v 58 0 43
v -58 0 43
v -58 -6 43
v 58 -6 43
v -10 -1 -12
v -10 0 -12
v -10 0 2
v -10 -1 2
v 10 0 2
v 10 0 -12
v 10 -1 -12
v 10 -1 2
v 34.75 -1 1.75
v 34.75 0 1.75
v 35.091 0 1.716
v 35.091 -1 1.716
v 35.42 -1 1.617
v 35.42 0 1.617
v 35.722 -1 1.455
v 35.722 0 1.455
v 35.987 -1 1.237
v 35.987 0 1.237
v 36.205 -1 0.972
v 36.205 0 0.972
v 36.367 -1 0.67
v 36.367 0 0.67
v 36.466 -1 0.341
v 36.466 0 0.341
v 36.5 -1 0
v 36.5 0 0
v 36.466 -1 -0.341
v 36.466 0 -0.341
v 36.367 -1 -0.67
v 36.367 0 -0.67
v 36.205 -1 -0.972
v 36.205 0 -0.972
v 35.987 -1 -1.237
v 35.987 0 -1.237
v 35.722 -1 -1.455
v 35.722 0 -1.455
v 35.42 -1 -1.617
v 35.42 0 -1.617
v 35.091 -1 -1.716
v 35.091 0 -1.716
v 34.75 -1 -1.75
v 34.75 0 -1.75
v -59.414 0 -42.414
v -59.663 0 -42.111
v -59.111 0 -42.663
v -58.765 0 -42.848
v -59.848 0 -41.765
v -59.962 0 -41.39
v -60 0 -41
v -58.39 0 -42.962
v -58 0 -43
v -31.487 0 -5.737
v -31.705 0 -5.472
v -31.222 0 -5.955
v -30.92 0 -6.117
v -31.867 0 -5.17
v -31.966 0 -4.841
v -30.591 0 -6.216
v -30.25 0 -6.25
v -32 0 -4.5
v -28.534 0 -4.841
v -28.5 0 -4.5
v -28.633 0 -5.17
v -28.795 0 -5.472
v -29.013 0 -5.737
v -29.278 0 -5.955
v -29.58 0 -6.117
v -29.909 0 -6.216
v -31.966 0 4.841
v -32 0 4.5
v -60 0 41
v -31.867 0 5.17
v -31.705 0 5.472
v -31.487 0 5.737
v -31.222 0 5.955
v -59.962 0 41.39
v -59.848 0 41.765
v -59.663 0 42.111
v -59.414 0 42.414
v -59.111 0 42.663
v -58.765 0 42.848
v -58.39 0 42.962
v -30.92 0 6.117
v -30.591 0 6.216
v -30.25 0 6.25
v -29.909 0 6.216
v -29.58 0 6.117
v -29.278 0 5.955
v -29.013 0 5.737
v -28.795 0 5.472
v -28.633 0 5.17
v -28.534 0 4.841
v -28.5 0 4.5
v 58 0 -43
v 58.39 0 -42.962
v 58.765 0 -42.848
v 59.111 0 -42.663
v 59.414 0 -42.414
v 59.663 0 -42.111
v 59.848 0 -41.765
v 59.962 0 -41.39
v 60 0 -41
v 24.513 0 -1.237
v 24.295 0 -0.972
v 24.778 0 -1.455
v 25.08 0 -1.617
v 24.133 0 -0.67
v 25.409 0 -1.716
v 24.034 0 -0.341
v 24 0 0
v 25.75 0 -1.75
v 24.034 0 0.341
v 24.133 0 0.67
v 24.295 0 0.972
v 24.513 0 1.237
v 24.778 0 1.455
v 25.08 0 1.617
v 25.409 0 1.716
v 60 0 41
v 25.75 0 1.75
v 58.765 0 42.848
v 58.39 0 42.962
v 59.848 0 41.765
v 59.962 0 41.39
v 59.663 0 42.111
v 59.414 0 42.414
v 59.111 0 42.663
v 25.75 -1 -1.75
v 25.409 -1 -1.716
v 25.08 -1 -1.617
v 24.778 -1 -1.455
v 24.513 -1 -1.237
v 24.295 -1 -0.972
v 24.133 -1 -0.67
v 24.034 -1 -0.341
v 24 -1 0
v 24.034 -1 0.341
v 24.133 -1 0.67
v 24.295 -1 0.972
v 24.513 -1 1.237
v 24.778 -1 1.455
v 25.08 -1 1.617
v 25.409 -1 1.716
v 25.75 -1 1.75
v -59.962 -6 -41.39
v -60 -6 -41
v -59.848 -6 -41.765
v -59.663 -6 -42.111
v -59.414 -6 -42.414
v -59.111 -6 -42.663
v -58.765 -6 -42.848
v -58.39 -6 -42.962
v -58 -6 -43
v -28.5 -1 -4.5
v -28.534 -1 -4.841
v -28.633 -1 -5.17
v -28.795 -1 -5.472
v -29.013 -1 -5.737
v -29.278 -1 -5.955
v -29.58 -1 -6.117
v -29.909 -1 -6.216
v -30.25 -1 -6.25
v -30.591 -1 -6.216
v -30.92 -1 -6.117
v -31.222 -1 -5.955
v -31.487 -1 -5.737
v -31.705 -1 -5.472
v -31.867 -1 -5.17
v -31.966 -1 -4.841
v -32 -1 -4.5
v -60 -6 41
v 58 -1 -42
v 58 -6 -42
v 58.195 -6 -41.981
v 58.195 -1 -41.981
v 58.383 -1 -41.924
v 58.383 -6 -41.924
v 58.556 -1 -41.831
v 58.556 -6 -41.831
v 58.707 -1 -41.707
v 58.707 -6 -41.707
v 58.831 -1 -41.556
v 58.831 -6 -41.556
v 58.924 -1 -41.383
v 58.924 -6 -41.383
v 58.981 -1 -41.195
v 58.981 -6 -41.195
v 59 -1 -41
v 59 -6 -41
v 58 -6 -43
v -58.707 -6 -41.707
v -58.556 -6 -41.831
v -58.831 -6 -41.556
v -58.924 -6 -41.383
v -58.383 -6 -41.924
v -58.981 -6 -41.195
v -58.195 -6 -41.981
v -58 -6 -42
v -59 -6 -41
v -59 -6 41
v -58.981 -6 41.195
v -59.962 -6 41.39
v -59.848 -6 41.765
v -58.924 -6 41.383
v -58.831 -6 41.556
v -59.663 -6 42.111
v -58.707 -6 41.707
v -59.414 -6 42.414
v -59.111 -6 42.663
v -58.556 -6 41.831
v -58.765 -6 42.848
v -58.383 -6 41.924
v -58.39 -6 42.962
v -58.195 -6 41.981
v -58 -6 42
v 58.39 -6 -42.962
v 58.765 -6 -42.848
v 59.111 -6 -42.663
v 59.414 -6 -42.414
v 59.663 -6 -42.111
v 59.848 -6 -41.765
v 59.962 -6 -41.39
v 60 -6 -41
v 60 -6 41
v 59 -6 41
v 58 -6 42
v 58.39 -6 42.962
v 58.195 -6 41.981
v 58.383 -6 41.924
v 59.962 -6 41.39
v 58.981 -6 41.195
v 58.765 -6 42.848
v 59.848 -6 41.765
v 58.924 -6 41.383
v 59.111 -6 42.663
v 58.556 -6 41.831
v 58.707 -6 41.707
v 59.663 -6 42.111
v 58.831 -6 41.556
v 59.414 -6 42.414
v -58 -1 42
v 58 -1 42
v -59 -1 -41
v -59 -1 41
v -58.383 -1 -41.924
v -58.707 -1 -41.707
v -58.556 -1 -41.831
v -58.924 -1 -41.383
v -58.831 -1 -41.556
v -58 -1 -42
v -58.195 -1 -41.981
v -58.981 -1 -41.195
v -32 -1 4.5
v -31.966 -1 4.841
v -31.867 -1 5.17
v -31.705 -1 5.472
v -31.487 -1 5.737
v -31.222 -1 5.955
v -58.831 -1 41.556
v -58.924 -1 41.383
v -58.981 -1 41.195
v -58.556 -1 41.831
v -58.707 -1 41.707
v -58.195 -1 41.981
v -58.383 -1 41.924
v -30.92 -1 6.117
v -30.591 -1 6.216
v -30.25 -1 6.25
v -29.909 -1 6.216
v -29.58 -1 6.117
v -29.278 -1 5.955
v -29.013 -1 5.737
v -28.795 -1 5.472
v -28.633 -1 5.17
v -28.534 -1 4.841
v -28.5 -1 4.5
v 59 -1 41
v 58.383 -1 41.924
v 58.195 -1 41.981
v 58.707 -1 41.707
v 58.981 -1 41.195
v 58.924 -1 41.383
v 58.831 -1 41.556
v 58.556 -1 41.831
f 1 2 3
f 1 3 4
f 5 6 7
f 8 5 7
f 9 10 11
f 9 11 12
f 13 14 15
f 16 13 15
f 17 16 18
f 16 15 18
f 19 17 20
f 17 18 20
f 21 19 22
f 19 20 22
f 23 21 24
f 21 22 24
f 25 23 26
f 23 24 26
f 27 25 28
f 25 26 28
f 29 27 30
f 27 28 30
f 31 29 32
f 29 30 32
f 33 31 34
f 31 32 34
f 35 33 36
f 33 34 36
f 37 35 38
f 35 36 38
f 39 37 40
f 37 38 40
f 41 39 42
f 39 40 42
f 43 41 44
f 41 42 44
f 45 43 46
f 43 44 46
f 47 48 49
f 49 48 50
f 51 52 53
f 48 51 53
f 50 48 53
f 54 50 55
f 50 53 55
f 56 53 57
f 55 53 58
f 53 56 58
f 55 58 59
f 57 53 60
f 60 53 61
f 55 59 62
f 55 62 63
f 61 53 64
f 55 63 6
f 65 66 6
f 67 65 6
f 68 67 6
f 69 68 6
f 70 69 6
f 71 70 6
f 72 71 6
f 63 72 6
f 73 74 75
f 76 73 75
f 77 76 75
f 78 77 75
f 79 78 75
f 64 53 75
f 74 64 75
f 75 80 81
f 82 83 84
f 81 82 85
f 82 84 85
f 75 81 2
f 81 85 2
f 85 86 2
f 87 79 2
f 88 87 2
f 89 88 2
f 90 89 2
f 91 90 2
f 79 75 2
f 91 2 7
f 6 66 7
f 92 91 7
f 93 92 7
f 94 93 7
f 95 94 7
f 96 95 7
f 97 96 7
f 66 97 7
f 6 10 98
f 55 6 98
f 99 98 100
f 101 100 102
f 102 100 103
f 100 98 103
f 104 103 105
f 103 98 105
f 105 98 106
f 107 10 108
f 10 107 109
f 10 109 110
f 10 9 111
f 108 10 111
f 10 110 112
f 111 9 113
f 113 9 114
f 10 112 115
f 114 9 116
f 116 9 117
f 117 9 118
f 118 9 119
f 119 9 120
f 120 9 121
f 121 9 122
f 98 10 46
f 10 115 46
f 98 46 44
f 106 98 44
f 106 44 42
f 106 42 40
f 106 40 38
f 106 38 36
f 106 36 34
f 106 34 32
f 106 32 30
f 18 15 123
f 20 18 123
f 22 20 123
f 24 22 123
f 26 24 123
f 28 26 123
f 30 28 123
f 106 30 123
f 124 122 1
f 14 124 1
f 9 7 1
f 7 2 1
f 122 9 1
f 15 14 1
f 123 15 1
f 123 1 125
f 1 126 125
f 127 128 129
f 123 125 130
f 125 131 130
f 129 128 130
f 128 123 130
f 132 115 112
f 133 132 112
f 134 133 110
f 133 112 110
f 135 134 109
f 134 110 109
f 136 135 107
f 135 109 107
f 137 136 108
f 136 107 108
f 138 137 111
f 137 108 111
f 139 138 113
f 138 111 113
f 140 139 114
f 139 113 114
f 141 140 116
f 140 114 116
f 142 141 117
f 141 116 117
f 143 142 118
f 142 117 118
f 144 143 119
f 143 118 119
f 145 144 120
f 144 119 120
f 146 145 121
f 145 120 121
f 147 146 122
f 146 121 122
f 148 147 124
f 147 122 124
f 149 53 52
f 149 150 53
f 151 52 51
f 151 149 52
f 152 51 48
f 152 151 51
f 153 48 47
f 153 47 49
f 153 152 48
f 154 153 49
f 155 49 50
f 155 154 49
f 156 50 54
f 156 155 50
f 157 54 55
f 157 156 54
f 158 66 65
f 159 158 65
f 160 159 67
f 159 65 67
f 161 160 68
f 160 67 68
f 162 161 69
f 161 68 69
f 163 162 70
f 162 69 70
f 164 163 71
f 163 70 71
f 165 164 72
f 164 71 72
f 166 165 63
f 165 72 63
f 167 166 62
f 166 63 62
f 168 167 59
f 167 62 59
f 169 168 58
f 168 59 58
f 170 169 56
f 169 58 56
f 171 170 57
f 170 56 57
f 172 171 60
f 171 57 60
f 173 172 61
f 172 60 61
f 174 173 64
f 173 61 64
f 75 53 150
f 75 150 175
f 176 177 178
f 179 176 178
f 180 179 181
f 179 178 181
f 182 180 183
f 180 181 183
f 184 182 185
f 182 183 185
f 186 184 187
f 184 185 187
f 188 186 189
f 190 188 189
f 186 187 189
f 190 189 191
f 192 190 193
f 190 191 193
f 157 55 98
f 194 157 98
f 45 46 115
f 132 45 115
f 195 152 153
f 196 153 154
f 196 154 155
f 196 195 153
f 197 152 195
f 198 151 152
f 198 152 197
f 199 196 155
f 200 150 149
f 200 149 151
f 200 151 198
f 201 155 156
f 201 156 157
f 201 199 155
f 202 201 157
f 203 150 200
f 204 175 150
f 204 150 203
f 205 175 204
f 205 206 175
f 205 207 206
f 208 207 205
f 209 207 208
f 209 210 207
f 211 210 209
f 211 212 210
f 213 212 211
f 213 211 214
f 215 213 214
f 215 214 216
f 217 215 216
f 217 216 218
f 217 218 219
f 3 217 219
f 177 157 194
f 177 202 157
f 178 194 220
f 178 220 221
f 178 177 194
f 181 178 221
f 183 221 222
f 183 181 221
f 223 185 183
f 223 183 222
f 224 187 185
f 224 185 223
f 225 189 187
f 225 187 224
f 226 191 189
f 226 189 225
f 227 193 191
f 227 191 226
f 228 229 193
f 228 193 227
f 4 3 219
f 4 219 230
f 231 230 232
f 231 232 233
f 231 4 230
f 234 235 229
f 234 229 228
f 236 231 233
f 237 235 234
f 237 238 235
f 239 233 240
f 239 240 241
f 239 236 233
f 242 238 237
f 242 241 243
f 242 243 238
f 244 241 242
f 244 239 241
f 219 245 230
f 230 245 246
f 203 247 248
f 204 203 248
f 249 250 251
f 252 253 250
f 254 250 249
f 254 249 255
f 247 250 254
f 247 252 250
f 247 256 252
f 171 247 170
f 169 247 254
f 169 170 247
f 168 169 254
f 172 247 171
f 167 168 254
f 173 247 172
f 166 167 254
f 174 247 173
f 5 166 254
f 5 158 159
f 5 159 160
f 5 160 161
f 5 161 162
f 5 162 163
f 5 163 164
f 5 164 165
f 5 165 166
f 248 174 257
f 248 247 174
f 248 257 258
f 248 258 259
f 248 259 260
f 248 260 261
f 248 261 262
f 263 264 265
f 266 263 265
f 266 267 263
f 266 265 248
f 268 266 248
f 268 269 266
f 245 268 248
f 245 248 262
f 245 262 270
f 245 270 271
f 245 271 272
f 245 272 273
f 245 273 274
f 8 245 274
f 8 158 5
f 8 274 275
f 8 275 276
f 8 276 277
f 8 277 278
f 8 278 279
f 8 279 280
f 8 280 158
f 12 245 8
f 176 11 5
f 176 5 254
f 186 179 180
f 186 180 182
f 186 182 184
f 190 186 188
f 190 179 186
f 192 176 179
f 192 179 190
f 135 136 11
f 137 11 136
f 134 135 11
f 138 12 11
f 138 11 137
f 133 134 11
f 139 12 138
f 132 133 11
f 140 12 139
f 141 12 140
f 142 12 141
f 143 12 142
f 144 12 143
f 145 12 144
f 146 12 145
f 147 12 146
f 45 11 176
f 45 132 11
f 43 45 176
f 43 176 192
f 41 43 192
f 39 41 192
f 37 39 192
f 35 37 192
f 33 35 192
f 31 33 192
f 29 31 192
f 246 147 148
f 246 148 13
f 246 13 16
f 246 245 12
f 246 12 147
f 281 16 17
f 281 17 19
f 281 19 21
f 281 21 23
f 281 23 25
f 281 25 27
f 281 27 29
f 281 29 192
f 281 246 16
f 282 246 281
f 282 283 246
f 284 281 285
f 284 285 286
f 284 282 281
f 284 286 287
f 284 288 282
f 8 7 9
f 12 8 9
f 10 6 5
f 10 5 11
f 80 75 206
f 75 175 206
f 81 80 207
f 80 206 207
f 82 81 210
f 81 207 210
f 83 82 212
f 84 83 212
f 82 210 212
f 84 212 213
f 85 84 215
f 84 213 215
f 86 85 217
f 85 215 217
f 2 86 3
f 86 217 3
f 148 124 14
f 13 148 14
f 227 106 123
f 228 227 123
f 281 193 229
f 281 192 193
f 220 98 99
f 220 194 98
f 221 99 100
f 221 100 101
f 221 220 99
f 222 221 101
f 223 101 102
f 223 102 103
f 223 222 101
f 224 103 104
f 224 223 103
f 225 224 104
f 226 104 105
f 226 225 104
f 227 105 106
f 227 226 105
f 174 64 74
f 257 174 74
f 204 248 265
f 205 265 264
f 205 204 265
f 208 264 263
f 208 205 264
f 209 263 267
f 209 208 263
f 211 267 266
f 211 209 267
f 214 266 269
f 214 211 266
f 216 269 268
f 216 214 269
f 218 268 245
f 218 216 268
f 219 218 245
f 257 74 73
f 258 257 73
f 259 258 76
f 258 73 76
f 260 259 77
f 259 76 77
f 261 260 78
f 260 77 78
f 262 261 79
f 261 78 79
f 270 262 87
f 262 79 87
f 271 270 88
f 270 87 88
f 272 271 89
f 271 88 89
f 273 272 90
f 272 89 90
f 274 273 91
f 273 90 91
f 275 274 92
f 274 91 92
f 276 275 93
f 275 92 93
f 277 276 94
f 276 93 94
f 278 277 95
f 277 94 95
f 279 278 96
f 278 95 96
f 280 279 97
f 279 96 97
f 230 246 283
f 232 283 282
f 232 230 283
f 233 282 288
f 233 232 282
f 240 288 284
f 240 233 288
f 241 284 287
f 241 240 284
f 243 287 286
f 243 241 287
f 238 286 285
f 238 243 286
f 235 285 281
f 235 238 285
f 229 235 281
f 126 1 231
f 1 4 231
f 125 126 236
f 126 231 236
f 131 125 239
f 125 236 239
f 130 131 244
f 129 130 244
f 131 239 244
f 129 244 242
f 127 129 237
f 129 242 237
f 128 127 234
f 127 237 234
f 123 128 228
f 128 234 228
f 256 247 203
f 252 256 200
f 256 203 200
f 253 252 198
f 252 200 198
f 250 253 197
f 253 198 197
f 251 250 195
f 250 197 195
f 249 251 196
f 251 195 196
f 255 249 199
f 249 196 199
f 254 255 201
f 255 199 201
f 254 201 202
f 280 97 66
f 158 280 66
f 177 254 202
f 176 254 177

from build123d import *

# Parameters (mm, degrees)
F0_W     = 120
F0_H     = 86
F0_W_2   = 20
F0_H_2   = 14
F1_DEPTH = 6
F2_R     = 2
F3_T     = -1


with BuildPart() as f1:
    # F0 (on Front) → F1 (new body)
    with BuildSketch(Plane.XZ):
        Rectangle(F0_W, F0_H)
        with Locations((0, -5)):
            Rectangle(F0_W_2, F0_H_2, mode=Mode.SUBTRACT)
        with BuildLine():
            Line((-28.5, 4.5), (-28.5, -4.5))
            ThreePointArc((-28.5, -4.5), (-30.25, -6.25), (-32, -4.5))
            Line((-32, -4.5), (-32, 4.5))
            ThreePointArc((-32, 4.5), (-30.25, 6.25), (-28.5, 4.5))
        make_face(mode=Mode.SUBTRACT)
        with BuildLine():
            Line((34.75, -1.75), (25.75, -1.75))
            ThreePointArc((25.75, -1.75), (24, 0), (25.75, 1.75))
            Line((25.75, 1.75), (34.75, 1.75))
            ThreePointArc((34.75, 1.75), (36.5, 0), (34.75, -1.75))
        make_face(mode=Mode.SUBTRACT)
    extrude(amount=F1_DEPTH)

    # F2
    f2_edges = [f1.edges().sort_by_distance(p)[0] for p in [
        (-60, -3, -43),
        (-60, -3, 43),
        (60, -3, 43),
        (60, -3, -43),
    ]]
    fillet(f2_edges, radius=F2_R)

    # F3
    f3_openings = [f1.faces().sort_by_distance(p)[0] for p in [
        (-28.5, -3, 0),
        (-30.25, -3, 6.25),
        (-32, -3, 0),
        (-30.25, -3, -6.25),
        (10, -3, -5),
        (0, -3, 2),
        (58.523653, -6, 0),
        (0, -3, -12),
        (-10, -3, -5),
        (30.25, -3, 1.75),
        (36.5, -3, 0),
        (24, -3, 0),
        (30.25, -3, -1.75),
    ]]
    offset(amount=F3_T, openings=f3_openings)


solid = f1.part
